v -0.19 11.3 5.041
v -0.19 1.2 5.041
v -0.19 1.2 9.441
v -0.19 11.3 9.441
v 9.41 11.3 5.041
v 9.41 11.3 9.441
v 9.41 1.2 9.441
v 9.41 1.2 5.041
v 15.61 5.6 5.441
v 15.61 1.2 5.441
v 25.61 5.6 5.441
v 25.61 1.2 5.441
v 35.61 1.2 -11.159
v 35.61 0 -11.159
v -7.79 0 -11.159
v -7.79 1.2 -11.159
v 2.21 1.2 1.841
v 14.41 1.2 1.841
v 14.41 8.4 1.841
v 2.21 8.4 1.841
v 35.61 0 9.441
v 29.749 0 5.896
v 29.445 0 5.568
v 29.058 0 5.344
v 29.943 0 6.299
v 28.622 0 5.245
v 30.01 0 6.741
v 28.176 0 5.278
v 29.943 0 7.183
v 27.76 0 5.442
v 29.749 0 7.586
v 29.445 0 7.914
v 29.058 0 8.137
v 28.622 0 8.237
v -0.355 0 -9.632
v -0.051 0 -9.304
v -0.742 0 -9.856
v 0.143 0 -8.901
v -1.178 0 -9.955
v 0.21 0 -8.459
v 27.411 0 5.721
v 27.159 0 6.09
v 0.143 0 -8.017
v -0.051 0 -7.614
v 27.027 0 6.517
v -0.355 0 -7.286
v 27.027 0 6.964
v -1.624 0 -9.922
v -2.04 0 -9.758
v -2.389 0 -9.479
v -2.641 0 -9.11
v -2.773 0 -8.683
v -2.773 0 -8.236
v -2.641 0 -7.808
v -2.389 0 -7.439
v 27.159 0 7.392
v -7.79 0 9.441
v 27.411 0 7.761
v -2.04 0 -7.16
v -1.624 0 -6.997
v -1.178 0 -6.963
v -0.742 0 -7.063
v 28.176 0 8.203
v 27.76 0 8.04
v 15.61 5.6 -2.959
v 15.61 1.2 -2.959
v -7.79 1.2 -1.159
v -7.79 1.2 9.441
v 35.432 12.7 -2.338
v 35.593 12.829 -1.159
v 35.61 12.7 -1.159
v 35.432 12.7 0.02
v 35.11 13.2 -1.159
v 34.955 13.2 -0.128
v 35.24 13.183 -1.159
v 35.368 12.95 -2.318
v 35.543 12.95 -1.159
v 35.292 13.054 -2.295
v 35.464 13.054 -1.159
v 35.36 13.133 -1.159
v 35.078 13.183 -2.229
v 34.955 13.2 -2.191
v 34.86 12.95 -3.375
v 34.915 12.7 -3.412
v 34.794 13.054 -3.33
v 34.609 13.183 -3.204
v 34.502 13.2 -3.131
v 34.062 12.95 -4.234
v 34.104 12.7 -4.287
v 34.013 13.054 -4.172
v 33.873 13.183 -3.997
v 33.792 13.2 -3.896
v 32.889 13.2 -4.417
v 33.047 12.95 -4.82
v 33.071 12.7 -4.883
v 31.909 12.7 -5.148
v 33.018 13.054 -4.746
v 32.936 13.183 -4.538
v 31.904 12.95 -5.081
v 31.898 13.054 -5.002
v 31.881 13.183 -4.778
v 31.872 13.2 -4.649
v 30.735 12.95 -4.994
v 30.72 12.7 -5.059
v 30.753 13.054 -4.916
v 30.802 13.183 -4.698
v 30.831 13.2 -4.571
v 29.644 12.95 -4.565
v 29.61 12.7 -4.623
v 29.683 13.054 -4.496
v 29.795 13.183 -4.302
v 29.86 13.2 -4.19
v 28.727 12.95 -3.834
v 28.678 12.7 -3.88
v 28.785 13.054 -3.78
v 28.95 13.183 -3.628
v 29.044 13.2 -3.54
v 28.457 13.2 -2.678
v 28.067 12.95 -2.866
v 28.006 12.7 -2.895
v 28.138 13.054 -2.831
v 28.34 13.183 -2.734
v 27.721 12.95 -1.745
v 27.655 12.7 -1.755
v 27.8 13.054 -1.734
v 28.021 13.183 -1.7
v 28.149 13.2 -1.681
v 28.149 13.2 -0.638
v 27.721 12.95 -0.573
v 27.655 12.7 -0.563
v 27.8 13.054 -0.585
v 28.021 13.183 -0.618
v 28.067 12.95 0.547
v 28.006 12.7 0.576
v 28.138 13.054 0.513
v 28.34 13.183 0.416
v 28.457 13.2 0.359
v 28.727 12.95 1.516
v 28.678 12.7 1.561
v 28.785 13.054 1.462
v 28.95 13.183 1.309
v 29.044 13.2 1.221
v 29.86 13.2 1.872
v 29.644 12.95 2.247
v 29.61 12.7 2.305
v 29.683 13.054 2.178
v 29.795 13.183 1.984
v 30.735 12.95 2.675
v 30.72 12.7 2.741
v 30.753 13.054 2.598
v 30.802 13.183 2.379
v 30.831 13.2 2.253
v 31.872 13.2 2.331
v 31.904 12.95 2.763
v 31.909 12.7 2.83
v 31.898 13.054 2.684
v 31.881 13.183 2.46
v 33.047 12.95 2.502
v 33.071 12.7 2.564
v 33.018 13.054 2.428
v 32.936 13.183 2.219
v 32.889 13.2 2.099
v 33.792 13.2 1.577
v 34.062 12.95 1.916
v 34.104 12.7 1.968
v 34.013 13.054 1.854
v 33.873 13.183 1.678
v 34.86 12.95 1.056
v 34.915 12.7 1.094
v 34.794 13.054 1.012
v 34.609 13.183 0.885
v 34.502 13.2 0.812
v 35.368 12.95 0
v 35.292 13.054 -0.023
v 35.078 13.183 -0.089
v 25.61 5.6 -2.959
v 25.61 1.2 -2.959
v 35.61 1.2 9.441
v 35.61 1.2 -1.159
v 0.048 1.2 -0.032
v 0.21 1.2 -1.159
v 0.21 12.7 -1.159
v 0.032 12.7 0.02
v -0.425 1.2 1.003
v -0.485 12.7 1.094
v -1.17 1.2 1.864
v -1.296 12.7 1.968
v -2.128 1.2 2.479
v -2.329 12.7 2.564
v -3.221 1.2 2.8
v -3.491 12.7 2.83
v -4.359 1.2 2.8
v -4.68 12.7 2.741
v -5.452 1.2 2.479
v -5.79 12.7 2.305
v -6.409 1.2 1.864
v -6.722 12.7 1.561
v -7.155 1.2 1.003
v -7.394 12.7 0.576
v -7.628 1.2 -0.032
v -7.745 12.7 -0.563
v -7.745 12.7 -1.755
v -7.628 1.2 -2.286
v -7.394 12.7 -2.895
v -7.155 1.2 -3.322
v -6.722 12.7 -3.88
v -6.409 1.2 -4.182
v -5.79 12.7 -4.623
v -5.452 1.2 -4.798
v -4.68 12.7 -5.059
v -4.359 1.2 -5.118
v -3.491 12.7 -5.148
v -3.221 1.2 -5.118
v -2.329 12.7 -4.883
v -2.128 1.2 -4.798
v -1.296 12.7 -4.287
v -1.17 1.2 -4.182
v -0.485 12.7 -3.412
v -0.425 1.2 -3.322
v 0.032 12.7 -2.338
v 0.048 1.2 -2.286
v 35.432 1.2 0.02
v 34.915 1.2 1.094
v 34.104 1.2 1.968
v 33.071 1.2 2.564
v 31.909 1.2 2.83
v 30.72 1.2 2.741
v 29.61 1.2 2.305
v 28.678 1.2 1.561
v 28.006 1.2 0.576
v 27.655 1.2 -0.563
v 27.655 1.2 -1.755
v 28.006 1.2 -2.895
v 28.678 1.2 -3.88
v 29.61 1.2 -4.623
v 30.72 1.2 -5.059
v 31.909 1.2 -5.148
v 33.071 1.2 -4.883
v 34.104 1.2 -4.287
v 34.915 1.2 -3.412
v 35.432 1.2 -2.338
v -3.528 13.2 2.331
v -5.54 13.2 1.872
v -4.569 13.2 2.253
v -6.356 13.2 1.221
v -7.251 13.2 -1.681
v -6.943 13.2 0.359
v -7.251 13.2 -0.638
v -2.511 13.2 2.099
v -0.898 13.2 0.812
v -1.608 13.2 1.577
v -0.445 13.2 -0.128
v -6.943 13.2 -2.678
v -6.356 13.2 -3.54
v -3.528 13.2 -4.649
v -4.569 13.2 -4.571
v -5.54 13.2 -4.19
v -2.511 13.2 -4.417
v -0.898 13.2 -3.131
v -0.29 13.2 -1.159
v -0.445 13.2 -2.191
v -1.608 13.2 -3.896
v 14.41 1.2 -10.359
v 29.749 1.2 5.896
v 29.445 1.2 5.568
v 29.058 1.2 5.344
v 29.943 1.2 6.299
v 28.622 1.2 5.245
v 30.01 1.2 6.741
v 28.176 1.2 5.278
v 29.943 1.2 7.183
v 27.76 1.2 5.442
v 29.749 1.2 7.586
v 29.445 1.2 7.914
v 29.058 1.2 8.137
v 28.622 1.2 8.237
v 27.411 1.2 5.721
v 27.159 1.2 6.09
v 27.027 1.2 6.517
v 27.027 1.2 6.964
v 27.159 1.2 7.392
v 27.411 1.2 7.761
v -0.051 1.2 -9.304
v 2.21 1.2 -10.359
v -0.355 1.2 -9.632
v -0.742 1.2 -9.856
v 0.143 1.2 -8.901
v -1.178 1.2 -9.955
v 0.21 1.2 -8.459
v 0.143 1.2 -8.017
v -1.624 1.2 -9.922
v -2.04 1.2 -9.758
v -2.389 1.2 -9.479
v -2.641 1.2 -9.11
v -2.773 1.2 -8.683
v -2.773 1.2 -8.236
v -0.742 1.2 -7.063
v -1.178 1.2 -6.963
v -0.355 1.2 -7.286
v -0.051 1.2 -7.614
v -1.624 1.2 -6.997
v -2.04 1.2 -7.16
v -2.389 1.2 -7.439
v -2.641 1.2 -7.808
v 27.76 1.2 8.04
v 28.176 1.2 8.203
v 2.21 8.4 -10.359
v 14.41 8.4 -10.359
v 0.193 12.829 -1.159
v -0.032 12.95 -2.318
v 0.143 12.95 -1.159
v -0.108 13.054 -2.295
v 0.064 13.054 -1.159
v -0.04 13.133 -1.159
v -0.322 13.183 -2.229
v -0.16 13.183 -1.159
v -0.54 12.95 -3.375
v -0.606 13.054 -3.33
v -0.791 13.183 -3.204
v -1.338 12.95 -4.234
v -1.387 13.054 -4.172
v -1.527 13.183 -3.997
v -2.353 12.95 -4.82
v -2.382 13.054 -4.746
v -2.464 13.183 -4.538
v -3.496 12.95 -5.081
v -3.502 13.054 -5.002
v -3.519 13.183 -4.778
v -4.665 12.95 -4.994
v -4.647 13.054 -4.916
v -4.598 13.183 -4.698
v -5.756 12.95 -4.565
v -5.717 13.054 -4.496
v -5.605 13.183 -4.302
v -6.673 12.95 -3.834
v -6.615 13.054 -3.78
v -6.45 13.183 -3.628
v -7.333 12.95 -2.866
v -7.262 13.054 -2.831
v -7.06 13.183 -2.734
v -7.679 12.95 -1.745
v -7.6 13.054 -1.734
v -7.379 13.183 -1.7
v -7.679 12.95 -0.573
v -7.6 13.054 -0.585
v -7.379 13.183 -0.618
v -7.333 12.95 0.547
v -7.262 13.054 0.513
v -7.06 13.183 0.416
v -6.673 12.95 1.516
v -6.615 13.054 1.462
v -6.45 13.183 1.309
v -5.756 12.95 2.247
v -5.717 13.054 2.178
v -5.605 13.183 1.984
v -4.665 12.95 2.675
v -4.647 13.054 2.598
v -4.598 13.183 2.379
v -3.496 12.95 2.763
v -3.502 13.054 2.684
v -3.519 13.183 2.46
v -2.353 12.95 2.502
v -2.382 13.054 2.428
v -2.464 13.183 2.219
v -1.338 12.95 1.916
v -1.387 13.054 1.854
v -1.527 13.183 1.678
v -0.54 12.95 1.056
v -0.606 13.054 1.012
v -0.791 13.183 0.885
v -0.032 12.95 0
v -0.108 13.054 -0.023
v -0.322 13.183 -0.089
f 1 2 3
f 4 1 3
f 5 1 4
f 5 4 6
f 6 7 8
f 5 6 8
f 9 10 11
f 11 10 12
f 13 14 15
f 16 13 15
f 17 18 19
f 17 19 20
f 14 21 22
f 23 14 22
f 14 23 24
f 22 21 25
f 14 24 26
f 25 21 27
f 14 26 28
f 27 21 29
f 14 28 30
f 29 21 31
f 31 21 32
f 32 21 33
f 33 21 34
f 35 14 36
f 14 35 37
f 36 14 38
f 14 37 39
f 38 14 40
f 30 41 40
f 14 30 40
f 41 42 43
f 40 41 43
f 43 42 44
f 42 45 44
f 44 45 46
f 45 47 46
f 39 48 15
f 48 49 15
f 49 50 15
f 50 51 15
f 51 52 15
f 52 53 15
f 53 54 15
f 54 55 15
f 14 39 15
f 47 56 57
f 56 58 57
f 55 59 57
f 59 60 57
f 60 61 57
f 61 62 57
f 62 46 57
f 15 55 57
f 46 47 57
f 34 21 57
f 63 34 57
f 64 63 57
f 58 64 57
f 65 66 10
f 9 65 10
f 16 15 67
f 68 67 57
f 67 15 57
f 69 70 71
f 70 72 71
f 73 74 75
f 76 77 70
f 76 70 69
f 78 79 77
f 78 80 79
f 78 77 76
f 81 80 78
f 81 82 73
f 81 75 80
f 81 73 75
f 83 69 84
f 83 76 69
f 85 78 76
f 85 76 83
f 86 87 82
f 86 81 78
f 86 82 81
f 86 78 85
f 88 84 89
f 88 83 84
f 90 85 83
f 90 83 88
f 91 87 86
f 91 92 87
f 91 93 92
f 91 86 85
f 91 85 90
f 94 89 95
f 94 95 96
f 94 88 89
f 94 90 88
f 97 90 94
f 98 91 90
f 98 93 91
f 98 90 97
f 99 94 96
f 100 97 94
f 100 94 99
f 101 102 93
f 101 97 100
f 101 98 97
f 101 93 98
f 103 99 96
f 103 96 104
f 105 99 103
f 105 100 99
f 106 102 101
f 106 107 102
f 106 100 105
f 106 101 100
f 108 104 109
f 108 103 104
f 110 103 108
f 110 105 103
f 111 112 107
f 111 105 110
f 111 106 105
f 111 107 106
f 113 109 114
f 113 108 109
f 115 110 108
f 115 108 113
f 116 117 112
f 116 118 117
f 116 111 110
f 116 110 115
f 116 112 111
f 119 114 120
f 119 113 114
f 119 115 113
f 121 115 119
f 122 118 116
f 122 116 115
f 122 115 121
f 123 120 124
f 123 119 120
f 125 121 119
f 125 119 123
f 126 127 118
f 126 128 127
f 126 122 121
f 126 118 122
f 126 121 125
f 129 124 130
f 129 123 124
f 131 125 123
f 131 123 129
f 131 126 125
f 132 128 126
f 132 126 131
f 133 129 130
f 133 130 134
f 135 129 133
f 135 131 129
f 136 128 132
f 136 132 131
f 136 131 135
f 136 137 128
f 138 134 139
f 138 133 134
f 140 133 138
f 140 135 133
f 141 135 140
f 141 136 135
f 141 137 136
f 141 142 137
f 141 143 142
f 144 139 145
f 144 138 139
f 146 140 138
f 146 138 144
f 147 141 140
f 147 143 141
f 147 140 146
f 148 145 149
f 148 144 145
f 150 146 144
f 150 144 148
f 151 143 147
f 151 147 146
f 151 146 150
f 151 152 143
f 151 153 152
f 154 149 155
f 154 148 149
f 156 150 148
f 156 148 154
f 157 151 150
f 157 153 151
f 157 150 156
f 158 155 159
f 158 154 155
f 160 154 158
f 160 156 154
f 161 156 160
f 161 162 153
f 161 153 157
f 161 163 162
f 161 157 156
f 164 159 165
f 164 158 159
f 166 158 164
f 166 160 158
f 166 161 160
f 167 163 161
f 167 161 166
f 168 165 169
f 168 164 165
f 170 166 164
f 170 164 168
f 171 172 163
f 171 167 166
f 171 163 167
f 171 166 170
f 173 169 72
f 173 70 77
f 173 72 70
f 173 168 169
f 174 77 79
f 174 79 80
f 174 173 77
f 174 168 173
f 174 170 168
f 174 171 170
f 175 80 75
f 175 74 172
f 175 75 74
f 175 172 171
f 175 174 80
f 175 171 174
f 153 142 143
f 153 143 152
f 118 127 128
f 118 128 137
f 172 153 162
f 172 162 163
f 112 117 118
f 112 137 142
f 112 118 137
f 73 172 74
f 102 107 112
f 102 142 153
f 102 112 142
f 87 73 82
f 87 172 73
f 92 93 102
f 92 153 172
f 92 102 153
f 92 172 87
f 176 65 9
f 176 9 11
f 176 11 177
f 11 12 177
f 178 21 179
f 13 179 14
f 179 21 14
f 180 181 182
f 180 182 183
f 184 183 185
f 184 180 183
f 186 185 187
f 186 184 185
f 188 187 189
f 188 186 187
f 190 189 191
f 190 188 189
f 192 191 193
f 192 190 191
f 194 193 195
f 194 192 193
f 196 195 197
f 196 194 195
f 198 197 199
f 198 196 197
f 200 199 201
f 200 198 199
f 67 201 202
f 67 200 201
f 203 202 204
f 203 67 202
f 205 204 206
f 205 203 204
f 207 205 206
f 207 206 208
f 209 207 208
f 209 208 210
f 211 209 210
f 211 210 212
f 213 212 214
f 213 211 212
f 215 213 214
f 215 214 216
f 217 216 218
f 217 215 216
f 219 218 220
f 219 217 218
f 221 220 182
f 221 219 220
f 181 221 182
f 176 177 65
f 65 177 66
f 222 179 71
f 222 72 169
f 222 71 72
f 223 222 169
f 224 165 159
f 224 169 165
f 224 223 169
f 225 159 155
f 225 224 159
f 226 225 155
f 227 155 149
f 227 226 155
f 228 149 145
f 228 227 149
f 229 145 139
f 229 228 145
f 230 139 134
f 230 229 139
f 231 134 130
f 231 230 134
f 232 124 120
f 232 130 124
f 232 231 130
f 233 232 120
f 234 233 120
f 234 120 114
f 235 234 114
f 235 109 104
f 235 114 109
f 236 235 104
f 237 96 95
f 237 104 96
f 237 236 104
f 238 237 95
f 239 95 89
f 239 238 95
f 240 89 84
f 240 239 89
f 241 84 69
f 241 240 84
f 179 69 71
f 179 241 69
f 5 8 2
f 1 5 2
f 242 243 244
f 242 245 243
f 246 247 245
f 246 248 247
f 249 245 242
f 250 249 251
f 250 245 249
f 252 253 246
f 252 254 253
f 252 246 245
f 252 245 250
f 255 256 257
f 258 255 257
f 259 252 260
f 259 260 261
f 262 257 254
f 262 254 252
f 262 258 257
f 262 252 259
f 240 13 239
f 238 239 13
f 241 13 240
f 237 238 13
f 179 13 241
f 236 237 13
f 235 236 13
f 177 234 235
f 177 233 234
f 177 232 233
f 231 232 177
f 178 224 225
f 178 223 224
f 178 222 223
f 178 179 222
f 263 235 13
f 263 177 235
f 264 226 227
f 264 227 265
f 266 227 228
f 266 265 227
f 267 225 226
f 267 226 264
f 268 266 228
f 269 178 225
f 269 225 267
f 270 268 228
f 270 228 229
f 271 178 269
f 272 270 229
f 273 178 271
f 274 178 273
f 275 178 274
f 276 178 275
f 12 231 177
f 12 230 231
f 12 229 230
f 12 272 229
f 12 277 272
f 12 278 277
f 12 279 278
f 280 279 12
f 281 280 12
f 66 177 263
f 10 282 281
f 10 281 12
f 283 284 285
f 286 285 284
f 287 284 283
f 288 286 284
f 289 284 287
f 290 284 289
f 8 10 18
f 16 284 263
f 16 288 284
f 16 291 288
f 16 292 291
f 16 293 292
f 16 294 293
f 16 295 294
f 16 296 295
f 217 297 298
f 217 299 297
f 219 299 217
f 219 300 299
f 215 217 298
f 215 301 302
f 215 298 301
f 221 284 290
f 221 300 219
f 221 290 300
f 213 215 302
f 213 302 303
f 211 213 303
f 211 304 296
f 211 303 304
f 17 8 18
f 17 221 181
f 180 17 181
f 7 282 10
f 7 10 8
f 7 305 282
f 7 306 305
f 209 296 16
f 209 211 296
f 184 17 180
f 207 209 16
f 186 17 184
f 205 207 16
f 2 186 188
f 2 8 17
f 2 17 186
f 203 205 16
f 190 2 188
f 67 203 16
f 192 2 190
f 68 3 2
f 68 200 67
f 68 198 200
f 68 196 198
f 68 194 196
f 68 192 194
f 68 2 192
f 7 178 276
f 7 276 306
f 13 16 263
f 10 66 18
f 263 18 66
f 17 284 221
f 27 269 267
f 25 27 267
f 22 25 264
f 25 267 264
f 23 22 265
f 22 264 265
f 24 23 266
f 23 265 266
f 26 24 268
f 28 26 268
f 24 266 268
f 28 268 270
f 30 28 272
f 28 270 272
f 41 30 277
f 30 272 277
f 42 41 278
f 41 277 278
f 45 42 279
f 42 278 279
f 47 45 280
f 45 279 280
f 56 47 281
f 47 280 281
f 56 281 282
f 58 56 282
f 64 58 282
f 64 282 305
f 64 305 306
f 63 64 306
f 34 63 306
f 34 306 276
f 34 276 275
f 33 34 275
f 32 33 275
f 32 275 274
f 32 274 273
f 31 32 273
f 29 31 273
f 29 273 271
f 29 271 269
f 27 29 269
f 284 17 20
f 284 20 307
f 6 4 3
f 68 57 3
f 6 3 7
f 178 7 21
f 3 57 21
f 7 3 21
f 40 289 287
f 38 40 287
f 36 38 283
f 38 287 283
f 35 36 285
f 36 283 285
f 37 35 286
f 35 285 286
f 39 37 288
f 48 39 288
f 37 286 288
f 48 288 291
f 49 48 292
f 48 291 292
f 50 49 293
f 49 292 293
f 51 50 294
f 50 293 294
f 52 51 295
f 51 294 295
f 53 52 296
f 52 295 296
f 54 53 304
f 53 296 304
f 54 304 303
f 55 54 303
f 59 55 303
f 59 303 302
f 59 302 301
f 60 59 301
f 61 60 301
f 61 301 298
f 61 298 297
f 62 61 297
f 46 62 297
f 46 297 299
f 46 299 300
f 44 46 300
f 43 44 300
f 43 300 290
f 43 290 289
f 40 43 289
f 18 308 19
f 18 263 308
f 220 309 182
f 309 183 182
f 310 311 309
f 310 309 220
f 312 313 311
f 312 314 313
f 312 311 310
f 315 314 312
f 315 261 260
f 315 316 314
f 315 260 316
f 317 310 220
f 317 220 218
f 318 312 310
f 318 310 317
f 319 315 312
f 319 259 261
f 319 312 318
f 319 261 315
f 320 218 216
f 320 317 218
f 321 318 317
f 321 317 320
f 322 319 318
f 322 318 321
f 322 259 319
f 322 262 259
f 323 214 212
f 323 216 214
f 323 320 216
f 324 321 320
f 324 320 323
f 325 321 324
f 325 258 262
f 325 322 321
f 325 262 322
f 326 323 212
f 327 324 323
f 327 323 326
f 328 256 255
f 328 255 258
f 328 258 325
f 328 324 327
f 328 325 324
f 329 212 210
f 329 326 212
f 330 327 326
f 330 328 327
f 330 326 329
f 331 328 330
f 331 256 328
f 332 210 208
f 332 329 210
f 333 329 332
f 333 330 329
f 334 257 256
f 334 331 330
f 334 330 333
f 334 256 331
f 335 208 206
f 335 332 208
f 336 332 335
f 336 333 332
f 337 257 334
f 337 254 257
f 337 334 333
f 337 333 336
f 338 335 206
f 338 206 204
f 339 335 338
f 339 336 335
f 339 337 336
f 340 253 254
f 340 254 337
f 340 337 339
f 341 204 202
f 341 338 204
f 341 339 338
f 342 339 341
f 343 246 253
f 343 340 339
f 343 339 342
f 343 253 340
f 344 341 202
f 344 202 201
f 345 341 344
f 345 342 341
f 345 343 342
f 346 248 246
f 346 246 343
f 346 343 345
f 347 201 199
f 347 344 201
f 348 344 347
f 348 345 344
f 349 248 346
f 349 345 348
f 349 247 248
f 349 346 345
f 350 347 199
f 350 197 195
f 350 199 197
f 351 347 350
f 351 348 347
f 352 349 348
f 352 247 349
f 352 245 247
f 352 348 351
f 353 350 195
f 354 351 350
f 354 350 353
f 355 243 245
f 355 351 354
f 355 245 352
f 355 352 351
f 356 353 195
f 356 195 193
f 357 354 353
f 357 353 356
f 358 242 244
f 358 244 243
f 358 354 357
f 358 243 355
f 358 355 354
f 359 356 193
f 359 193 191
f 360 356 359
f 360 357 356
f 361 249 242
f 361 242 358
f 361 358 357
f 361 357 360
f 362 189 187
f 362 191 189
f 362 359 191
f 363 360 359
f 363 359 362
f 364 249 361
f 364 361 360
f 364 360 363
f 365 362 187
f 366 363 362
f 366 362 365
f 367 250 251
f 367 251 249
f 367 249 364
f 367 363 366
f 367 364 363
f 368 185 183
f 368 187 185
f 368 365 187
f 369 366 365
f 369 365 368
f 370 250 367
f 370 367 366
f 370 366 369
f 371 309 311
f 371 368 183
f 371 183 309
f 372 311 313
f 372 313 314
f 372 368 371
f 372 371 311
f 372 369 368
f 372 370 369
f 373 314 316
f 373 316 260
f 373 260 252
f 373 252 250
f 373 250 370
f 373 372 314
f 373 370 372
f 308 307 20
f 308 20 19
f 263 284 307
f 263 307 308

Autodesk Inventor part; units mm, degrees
ref_plane "YZ Plane" through (0, 0, 0) normal (1, 0, 0) x (0, 1, 0)
ref_plane "XZ Plane" through (0, 0, 0) normal (0, 1, 0) x (-1, 0, 0)
ref_plane "XY Plane" through (0, 0, 0) normal (0, 0, 1) x (1, 0, 0)
sketch "Sketch1" plane through (0, 0, 0) normal (0, 1, 0) x (-1, 0, 0)
  line L0 (7.7899, 9.4408) -> (-35.6101, 9.4408)
  line L1 (-35.6101, 9.4408) -> (-35.6101, -11.1592)
  line L2 (-35.6101, -11.1592) -> (7.7899, -11.1592)
  line L3 (7.7899, -11.1592) -> (7.7899, 9.4408)
  point P0 (0, 0)
  dimension "d0" = 43.4
  dimension "d1" = 20.6
extrude "Extrusion1" add sketch "Sketch1" along normal blind 1.2
sketch "Sketch2" plane through (0, 1.2, 0) normal (0, 1, 0) x (1, 0, 0)
  circle A0 centre (31.6101, 1.1592) radius 4
  line L0 (35.6101, 11.1592) -> (-7.7899, 11.1592) projected
  circle A1 centre (-3.7899, 1.1592) radius 4
  line L1 (-7.7899, 11.1592) -> (-7.7899, -9.4408) projected
  line L2 (35.6101, -9.4408) -> (35.6101, 11.1592) projected
  point P0 (0, 0)
  dimension "d4" = 8
  dimension "d5" = 10
  dimension "d6" = 8
  dimension "d7" = 4
  dimension "d8" = 4
extrude "Extrusion2" add sketch "Sketch2" along normal blind 12
fillet "Fillet1" radius 0.5 2 edges at (27.6101, 13.2, -1.1592) (-7.7899, 13.2, -1.1592)
sketch "Sketch3" plane through (0, 1.2, 0) normal (0, 1, 0) x (1, 0, 0)
  line L0 (9.4101, -5.0408) -> (-0.1899, -5.0408)
  line L1 (-0.1899, -5.0408) -> (-0.1899, -9.4408)
  line L2 (-0.1899, -9.4408) -> (9.4101, -9.4408)
  line L3 (9.4101, -9.4408) -> (9.4101, -5.0408)
  line L4 (-7.7899, -9.4408) -> (35.6101, -9.4408) projected
  line L5 (-7.7899, 1.1592) -> (-7.7899, -9.4408) projected
  point P0 (0, 0)
  dimension "d12" = 9.6
  dimension "d13" = 4.4
  dimension "d14" = 0
  dimension "d15" = 7.6
extrude "Extrusion3" add sketch "Sketch3" along normal blind 10.1
sketch "Sketch4" plane through (0, 1.2, 0) normal (0, 1, 0) x (1, 0, 0)
  circle A0 centre (28.5101, -6.7408) radius 1.5
  line L0 (35.6101, -9.4408) -> (35.6101, 1.1592) projected
  line L1 (-7.7899, -9.4408) -> (35.6101, -9.4408) projected
  circle A1 centre (-1.2899, 8.4592) radius 1.5
  line L2 (35.6101, 11.1592) -> (-7.7899, 11.1592) projected
  line L3 (-7.7899, 11.1592) -> (-7.7899, -9.4408) projected
  point P0 (0, 0)
  dimension "d18" = 3
  dimension "d19" = 7.1
  dimension "d20" = 2.7
  dimension "d21" = 3
  dimension "d22" = 2.7
  dimension "d23" = 6.5
extrude "Extrusion4" cut sketch "Sketch4" against normal blind 10.1
sketch "Sketch5" plane through (0, 1.2, 0) normal (0, 1, 0) x (1, 0, 0)
  line L0 (14.4101, -1.8408) -> (2.2101, -1.8408)
  line L1 (2.2101, -1.8408) -> (2.2101, 10.3592)
  line L2 (2.2101, 10.3592) -> (14.4101, 10.3592)
  line L3 (14.4101, 10.3592) -> (14.4101, -1.8408)
  line L4 (35.6101, 11.1592) -> (-7.7899, 11.1592) projected
  line L5 (-7.7899, 11.1592) -> (-7.7899, 1.1592) projected
  point P0 (0, 0)
  dimension "d26" = 12.2
  dimension "d27" = 12.2
  dimension "d28" = 0.8
  dimension "d29" = 10
extrude "Extrusion5" add sketch "Sketch5" along normal blind 7.2
sketch "Sketch6" plane through (0, 1.2, 0) normal (0, 1, 0) x (1, 0, 0)
  line L0 (25.6101, 2.9592) -> (15.6101, 2.9592)
  line L1 (15.6101, 2.9592) -> (15.6101, -5.4408)
  line L2 (15.6101, -5.4408) -> (25.6101, -5.4408)
  line L3 (25.6101, -5.4408) -> (25.6101, 2.9592)
  line L4 (9.4101, -9.4408) -> (35.6101, -9.4408) projected
  line L5 (35.6101, -9.4408) -> (35.6101, 1.1592) projected
  point P0 (0, 0)
  dimension "d32" = 10
  dimension "d33" = 8.4
  dimension "d34" = 4
  dimension "d35" = 10
extrude "Extrusion6" add sketch "Sketch6" along normal blind 4.4
sketch "Sketch7" plane through (0, 1.2, 0) normal (0, 1, 0) x (1, 0, 0)
  circle A0 centre (28.5101, -6.7408) radius 1.5 projected
  circle A1 centre (28.5101, -6.7408) radius 1.5
  circle A2 centre (-1.2899, 8.4592) radius 1.5 projected
  circle A3 centre (-1.2899, 8.4592) radius 1.5
  point P0 (0, 0)
properties part number "DC menic"
